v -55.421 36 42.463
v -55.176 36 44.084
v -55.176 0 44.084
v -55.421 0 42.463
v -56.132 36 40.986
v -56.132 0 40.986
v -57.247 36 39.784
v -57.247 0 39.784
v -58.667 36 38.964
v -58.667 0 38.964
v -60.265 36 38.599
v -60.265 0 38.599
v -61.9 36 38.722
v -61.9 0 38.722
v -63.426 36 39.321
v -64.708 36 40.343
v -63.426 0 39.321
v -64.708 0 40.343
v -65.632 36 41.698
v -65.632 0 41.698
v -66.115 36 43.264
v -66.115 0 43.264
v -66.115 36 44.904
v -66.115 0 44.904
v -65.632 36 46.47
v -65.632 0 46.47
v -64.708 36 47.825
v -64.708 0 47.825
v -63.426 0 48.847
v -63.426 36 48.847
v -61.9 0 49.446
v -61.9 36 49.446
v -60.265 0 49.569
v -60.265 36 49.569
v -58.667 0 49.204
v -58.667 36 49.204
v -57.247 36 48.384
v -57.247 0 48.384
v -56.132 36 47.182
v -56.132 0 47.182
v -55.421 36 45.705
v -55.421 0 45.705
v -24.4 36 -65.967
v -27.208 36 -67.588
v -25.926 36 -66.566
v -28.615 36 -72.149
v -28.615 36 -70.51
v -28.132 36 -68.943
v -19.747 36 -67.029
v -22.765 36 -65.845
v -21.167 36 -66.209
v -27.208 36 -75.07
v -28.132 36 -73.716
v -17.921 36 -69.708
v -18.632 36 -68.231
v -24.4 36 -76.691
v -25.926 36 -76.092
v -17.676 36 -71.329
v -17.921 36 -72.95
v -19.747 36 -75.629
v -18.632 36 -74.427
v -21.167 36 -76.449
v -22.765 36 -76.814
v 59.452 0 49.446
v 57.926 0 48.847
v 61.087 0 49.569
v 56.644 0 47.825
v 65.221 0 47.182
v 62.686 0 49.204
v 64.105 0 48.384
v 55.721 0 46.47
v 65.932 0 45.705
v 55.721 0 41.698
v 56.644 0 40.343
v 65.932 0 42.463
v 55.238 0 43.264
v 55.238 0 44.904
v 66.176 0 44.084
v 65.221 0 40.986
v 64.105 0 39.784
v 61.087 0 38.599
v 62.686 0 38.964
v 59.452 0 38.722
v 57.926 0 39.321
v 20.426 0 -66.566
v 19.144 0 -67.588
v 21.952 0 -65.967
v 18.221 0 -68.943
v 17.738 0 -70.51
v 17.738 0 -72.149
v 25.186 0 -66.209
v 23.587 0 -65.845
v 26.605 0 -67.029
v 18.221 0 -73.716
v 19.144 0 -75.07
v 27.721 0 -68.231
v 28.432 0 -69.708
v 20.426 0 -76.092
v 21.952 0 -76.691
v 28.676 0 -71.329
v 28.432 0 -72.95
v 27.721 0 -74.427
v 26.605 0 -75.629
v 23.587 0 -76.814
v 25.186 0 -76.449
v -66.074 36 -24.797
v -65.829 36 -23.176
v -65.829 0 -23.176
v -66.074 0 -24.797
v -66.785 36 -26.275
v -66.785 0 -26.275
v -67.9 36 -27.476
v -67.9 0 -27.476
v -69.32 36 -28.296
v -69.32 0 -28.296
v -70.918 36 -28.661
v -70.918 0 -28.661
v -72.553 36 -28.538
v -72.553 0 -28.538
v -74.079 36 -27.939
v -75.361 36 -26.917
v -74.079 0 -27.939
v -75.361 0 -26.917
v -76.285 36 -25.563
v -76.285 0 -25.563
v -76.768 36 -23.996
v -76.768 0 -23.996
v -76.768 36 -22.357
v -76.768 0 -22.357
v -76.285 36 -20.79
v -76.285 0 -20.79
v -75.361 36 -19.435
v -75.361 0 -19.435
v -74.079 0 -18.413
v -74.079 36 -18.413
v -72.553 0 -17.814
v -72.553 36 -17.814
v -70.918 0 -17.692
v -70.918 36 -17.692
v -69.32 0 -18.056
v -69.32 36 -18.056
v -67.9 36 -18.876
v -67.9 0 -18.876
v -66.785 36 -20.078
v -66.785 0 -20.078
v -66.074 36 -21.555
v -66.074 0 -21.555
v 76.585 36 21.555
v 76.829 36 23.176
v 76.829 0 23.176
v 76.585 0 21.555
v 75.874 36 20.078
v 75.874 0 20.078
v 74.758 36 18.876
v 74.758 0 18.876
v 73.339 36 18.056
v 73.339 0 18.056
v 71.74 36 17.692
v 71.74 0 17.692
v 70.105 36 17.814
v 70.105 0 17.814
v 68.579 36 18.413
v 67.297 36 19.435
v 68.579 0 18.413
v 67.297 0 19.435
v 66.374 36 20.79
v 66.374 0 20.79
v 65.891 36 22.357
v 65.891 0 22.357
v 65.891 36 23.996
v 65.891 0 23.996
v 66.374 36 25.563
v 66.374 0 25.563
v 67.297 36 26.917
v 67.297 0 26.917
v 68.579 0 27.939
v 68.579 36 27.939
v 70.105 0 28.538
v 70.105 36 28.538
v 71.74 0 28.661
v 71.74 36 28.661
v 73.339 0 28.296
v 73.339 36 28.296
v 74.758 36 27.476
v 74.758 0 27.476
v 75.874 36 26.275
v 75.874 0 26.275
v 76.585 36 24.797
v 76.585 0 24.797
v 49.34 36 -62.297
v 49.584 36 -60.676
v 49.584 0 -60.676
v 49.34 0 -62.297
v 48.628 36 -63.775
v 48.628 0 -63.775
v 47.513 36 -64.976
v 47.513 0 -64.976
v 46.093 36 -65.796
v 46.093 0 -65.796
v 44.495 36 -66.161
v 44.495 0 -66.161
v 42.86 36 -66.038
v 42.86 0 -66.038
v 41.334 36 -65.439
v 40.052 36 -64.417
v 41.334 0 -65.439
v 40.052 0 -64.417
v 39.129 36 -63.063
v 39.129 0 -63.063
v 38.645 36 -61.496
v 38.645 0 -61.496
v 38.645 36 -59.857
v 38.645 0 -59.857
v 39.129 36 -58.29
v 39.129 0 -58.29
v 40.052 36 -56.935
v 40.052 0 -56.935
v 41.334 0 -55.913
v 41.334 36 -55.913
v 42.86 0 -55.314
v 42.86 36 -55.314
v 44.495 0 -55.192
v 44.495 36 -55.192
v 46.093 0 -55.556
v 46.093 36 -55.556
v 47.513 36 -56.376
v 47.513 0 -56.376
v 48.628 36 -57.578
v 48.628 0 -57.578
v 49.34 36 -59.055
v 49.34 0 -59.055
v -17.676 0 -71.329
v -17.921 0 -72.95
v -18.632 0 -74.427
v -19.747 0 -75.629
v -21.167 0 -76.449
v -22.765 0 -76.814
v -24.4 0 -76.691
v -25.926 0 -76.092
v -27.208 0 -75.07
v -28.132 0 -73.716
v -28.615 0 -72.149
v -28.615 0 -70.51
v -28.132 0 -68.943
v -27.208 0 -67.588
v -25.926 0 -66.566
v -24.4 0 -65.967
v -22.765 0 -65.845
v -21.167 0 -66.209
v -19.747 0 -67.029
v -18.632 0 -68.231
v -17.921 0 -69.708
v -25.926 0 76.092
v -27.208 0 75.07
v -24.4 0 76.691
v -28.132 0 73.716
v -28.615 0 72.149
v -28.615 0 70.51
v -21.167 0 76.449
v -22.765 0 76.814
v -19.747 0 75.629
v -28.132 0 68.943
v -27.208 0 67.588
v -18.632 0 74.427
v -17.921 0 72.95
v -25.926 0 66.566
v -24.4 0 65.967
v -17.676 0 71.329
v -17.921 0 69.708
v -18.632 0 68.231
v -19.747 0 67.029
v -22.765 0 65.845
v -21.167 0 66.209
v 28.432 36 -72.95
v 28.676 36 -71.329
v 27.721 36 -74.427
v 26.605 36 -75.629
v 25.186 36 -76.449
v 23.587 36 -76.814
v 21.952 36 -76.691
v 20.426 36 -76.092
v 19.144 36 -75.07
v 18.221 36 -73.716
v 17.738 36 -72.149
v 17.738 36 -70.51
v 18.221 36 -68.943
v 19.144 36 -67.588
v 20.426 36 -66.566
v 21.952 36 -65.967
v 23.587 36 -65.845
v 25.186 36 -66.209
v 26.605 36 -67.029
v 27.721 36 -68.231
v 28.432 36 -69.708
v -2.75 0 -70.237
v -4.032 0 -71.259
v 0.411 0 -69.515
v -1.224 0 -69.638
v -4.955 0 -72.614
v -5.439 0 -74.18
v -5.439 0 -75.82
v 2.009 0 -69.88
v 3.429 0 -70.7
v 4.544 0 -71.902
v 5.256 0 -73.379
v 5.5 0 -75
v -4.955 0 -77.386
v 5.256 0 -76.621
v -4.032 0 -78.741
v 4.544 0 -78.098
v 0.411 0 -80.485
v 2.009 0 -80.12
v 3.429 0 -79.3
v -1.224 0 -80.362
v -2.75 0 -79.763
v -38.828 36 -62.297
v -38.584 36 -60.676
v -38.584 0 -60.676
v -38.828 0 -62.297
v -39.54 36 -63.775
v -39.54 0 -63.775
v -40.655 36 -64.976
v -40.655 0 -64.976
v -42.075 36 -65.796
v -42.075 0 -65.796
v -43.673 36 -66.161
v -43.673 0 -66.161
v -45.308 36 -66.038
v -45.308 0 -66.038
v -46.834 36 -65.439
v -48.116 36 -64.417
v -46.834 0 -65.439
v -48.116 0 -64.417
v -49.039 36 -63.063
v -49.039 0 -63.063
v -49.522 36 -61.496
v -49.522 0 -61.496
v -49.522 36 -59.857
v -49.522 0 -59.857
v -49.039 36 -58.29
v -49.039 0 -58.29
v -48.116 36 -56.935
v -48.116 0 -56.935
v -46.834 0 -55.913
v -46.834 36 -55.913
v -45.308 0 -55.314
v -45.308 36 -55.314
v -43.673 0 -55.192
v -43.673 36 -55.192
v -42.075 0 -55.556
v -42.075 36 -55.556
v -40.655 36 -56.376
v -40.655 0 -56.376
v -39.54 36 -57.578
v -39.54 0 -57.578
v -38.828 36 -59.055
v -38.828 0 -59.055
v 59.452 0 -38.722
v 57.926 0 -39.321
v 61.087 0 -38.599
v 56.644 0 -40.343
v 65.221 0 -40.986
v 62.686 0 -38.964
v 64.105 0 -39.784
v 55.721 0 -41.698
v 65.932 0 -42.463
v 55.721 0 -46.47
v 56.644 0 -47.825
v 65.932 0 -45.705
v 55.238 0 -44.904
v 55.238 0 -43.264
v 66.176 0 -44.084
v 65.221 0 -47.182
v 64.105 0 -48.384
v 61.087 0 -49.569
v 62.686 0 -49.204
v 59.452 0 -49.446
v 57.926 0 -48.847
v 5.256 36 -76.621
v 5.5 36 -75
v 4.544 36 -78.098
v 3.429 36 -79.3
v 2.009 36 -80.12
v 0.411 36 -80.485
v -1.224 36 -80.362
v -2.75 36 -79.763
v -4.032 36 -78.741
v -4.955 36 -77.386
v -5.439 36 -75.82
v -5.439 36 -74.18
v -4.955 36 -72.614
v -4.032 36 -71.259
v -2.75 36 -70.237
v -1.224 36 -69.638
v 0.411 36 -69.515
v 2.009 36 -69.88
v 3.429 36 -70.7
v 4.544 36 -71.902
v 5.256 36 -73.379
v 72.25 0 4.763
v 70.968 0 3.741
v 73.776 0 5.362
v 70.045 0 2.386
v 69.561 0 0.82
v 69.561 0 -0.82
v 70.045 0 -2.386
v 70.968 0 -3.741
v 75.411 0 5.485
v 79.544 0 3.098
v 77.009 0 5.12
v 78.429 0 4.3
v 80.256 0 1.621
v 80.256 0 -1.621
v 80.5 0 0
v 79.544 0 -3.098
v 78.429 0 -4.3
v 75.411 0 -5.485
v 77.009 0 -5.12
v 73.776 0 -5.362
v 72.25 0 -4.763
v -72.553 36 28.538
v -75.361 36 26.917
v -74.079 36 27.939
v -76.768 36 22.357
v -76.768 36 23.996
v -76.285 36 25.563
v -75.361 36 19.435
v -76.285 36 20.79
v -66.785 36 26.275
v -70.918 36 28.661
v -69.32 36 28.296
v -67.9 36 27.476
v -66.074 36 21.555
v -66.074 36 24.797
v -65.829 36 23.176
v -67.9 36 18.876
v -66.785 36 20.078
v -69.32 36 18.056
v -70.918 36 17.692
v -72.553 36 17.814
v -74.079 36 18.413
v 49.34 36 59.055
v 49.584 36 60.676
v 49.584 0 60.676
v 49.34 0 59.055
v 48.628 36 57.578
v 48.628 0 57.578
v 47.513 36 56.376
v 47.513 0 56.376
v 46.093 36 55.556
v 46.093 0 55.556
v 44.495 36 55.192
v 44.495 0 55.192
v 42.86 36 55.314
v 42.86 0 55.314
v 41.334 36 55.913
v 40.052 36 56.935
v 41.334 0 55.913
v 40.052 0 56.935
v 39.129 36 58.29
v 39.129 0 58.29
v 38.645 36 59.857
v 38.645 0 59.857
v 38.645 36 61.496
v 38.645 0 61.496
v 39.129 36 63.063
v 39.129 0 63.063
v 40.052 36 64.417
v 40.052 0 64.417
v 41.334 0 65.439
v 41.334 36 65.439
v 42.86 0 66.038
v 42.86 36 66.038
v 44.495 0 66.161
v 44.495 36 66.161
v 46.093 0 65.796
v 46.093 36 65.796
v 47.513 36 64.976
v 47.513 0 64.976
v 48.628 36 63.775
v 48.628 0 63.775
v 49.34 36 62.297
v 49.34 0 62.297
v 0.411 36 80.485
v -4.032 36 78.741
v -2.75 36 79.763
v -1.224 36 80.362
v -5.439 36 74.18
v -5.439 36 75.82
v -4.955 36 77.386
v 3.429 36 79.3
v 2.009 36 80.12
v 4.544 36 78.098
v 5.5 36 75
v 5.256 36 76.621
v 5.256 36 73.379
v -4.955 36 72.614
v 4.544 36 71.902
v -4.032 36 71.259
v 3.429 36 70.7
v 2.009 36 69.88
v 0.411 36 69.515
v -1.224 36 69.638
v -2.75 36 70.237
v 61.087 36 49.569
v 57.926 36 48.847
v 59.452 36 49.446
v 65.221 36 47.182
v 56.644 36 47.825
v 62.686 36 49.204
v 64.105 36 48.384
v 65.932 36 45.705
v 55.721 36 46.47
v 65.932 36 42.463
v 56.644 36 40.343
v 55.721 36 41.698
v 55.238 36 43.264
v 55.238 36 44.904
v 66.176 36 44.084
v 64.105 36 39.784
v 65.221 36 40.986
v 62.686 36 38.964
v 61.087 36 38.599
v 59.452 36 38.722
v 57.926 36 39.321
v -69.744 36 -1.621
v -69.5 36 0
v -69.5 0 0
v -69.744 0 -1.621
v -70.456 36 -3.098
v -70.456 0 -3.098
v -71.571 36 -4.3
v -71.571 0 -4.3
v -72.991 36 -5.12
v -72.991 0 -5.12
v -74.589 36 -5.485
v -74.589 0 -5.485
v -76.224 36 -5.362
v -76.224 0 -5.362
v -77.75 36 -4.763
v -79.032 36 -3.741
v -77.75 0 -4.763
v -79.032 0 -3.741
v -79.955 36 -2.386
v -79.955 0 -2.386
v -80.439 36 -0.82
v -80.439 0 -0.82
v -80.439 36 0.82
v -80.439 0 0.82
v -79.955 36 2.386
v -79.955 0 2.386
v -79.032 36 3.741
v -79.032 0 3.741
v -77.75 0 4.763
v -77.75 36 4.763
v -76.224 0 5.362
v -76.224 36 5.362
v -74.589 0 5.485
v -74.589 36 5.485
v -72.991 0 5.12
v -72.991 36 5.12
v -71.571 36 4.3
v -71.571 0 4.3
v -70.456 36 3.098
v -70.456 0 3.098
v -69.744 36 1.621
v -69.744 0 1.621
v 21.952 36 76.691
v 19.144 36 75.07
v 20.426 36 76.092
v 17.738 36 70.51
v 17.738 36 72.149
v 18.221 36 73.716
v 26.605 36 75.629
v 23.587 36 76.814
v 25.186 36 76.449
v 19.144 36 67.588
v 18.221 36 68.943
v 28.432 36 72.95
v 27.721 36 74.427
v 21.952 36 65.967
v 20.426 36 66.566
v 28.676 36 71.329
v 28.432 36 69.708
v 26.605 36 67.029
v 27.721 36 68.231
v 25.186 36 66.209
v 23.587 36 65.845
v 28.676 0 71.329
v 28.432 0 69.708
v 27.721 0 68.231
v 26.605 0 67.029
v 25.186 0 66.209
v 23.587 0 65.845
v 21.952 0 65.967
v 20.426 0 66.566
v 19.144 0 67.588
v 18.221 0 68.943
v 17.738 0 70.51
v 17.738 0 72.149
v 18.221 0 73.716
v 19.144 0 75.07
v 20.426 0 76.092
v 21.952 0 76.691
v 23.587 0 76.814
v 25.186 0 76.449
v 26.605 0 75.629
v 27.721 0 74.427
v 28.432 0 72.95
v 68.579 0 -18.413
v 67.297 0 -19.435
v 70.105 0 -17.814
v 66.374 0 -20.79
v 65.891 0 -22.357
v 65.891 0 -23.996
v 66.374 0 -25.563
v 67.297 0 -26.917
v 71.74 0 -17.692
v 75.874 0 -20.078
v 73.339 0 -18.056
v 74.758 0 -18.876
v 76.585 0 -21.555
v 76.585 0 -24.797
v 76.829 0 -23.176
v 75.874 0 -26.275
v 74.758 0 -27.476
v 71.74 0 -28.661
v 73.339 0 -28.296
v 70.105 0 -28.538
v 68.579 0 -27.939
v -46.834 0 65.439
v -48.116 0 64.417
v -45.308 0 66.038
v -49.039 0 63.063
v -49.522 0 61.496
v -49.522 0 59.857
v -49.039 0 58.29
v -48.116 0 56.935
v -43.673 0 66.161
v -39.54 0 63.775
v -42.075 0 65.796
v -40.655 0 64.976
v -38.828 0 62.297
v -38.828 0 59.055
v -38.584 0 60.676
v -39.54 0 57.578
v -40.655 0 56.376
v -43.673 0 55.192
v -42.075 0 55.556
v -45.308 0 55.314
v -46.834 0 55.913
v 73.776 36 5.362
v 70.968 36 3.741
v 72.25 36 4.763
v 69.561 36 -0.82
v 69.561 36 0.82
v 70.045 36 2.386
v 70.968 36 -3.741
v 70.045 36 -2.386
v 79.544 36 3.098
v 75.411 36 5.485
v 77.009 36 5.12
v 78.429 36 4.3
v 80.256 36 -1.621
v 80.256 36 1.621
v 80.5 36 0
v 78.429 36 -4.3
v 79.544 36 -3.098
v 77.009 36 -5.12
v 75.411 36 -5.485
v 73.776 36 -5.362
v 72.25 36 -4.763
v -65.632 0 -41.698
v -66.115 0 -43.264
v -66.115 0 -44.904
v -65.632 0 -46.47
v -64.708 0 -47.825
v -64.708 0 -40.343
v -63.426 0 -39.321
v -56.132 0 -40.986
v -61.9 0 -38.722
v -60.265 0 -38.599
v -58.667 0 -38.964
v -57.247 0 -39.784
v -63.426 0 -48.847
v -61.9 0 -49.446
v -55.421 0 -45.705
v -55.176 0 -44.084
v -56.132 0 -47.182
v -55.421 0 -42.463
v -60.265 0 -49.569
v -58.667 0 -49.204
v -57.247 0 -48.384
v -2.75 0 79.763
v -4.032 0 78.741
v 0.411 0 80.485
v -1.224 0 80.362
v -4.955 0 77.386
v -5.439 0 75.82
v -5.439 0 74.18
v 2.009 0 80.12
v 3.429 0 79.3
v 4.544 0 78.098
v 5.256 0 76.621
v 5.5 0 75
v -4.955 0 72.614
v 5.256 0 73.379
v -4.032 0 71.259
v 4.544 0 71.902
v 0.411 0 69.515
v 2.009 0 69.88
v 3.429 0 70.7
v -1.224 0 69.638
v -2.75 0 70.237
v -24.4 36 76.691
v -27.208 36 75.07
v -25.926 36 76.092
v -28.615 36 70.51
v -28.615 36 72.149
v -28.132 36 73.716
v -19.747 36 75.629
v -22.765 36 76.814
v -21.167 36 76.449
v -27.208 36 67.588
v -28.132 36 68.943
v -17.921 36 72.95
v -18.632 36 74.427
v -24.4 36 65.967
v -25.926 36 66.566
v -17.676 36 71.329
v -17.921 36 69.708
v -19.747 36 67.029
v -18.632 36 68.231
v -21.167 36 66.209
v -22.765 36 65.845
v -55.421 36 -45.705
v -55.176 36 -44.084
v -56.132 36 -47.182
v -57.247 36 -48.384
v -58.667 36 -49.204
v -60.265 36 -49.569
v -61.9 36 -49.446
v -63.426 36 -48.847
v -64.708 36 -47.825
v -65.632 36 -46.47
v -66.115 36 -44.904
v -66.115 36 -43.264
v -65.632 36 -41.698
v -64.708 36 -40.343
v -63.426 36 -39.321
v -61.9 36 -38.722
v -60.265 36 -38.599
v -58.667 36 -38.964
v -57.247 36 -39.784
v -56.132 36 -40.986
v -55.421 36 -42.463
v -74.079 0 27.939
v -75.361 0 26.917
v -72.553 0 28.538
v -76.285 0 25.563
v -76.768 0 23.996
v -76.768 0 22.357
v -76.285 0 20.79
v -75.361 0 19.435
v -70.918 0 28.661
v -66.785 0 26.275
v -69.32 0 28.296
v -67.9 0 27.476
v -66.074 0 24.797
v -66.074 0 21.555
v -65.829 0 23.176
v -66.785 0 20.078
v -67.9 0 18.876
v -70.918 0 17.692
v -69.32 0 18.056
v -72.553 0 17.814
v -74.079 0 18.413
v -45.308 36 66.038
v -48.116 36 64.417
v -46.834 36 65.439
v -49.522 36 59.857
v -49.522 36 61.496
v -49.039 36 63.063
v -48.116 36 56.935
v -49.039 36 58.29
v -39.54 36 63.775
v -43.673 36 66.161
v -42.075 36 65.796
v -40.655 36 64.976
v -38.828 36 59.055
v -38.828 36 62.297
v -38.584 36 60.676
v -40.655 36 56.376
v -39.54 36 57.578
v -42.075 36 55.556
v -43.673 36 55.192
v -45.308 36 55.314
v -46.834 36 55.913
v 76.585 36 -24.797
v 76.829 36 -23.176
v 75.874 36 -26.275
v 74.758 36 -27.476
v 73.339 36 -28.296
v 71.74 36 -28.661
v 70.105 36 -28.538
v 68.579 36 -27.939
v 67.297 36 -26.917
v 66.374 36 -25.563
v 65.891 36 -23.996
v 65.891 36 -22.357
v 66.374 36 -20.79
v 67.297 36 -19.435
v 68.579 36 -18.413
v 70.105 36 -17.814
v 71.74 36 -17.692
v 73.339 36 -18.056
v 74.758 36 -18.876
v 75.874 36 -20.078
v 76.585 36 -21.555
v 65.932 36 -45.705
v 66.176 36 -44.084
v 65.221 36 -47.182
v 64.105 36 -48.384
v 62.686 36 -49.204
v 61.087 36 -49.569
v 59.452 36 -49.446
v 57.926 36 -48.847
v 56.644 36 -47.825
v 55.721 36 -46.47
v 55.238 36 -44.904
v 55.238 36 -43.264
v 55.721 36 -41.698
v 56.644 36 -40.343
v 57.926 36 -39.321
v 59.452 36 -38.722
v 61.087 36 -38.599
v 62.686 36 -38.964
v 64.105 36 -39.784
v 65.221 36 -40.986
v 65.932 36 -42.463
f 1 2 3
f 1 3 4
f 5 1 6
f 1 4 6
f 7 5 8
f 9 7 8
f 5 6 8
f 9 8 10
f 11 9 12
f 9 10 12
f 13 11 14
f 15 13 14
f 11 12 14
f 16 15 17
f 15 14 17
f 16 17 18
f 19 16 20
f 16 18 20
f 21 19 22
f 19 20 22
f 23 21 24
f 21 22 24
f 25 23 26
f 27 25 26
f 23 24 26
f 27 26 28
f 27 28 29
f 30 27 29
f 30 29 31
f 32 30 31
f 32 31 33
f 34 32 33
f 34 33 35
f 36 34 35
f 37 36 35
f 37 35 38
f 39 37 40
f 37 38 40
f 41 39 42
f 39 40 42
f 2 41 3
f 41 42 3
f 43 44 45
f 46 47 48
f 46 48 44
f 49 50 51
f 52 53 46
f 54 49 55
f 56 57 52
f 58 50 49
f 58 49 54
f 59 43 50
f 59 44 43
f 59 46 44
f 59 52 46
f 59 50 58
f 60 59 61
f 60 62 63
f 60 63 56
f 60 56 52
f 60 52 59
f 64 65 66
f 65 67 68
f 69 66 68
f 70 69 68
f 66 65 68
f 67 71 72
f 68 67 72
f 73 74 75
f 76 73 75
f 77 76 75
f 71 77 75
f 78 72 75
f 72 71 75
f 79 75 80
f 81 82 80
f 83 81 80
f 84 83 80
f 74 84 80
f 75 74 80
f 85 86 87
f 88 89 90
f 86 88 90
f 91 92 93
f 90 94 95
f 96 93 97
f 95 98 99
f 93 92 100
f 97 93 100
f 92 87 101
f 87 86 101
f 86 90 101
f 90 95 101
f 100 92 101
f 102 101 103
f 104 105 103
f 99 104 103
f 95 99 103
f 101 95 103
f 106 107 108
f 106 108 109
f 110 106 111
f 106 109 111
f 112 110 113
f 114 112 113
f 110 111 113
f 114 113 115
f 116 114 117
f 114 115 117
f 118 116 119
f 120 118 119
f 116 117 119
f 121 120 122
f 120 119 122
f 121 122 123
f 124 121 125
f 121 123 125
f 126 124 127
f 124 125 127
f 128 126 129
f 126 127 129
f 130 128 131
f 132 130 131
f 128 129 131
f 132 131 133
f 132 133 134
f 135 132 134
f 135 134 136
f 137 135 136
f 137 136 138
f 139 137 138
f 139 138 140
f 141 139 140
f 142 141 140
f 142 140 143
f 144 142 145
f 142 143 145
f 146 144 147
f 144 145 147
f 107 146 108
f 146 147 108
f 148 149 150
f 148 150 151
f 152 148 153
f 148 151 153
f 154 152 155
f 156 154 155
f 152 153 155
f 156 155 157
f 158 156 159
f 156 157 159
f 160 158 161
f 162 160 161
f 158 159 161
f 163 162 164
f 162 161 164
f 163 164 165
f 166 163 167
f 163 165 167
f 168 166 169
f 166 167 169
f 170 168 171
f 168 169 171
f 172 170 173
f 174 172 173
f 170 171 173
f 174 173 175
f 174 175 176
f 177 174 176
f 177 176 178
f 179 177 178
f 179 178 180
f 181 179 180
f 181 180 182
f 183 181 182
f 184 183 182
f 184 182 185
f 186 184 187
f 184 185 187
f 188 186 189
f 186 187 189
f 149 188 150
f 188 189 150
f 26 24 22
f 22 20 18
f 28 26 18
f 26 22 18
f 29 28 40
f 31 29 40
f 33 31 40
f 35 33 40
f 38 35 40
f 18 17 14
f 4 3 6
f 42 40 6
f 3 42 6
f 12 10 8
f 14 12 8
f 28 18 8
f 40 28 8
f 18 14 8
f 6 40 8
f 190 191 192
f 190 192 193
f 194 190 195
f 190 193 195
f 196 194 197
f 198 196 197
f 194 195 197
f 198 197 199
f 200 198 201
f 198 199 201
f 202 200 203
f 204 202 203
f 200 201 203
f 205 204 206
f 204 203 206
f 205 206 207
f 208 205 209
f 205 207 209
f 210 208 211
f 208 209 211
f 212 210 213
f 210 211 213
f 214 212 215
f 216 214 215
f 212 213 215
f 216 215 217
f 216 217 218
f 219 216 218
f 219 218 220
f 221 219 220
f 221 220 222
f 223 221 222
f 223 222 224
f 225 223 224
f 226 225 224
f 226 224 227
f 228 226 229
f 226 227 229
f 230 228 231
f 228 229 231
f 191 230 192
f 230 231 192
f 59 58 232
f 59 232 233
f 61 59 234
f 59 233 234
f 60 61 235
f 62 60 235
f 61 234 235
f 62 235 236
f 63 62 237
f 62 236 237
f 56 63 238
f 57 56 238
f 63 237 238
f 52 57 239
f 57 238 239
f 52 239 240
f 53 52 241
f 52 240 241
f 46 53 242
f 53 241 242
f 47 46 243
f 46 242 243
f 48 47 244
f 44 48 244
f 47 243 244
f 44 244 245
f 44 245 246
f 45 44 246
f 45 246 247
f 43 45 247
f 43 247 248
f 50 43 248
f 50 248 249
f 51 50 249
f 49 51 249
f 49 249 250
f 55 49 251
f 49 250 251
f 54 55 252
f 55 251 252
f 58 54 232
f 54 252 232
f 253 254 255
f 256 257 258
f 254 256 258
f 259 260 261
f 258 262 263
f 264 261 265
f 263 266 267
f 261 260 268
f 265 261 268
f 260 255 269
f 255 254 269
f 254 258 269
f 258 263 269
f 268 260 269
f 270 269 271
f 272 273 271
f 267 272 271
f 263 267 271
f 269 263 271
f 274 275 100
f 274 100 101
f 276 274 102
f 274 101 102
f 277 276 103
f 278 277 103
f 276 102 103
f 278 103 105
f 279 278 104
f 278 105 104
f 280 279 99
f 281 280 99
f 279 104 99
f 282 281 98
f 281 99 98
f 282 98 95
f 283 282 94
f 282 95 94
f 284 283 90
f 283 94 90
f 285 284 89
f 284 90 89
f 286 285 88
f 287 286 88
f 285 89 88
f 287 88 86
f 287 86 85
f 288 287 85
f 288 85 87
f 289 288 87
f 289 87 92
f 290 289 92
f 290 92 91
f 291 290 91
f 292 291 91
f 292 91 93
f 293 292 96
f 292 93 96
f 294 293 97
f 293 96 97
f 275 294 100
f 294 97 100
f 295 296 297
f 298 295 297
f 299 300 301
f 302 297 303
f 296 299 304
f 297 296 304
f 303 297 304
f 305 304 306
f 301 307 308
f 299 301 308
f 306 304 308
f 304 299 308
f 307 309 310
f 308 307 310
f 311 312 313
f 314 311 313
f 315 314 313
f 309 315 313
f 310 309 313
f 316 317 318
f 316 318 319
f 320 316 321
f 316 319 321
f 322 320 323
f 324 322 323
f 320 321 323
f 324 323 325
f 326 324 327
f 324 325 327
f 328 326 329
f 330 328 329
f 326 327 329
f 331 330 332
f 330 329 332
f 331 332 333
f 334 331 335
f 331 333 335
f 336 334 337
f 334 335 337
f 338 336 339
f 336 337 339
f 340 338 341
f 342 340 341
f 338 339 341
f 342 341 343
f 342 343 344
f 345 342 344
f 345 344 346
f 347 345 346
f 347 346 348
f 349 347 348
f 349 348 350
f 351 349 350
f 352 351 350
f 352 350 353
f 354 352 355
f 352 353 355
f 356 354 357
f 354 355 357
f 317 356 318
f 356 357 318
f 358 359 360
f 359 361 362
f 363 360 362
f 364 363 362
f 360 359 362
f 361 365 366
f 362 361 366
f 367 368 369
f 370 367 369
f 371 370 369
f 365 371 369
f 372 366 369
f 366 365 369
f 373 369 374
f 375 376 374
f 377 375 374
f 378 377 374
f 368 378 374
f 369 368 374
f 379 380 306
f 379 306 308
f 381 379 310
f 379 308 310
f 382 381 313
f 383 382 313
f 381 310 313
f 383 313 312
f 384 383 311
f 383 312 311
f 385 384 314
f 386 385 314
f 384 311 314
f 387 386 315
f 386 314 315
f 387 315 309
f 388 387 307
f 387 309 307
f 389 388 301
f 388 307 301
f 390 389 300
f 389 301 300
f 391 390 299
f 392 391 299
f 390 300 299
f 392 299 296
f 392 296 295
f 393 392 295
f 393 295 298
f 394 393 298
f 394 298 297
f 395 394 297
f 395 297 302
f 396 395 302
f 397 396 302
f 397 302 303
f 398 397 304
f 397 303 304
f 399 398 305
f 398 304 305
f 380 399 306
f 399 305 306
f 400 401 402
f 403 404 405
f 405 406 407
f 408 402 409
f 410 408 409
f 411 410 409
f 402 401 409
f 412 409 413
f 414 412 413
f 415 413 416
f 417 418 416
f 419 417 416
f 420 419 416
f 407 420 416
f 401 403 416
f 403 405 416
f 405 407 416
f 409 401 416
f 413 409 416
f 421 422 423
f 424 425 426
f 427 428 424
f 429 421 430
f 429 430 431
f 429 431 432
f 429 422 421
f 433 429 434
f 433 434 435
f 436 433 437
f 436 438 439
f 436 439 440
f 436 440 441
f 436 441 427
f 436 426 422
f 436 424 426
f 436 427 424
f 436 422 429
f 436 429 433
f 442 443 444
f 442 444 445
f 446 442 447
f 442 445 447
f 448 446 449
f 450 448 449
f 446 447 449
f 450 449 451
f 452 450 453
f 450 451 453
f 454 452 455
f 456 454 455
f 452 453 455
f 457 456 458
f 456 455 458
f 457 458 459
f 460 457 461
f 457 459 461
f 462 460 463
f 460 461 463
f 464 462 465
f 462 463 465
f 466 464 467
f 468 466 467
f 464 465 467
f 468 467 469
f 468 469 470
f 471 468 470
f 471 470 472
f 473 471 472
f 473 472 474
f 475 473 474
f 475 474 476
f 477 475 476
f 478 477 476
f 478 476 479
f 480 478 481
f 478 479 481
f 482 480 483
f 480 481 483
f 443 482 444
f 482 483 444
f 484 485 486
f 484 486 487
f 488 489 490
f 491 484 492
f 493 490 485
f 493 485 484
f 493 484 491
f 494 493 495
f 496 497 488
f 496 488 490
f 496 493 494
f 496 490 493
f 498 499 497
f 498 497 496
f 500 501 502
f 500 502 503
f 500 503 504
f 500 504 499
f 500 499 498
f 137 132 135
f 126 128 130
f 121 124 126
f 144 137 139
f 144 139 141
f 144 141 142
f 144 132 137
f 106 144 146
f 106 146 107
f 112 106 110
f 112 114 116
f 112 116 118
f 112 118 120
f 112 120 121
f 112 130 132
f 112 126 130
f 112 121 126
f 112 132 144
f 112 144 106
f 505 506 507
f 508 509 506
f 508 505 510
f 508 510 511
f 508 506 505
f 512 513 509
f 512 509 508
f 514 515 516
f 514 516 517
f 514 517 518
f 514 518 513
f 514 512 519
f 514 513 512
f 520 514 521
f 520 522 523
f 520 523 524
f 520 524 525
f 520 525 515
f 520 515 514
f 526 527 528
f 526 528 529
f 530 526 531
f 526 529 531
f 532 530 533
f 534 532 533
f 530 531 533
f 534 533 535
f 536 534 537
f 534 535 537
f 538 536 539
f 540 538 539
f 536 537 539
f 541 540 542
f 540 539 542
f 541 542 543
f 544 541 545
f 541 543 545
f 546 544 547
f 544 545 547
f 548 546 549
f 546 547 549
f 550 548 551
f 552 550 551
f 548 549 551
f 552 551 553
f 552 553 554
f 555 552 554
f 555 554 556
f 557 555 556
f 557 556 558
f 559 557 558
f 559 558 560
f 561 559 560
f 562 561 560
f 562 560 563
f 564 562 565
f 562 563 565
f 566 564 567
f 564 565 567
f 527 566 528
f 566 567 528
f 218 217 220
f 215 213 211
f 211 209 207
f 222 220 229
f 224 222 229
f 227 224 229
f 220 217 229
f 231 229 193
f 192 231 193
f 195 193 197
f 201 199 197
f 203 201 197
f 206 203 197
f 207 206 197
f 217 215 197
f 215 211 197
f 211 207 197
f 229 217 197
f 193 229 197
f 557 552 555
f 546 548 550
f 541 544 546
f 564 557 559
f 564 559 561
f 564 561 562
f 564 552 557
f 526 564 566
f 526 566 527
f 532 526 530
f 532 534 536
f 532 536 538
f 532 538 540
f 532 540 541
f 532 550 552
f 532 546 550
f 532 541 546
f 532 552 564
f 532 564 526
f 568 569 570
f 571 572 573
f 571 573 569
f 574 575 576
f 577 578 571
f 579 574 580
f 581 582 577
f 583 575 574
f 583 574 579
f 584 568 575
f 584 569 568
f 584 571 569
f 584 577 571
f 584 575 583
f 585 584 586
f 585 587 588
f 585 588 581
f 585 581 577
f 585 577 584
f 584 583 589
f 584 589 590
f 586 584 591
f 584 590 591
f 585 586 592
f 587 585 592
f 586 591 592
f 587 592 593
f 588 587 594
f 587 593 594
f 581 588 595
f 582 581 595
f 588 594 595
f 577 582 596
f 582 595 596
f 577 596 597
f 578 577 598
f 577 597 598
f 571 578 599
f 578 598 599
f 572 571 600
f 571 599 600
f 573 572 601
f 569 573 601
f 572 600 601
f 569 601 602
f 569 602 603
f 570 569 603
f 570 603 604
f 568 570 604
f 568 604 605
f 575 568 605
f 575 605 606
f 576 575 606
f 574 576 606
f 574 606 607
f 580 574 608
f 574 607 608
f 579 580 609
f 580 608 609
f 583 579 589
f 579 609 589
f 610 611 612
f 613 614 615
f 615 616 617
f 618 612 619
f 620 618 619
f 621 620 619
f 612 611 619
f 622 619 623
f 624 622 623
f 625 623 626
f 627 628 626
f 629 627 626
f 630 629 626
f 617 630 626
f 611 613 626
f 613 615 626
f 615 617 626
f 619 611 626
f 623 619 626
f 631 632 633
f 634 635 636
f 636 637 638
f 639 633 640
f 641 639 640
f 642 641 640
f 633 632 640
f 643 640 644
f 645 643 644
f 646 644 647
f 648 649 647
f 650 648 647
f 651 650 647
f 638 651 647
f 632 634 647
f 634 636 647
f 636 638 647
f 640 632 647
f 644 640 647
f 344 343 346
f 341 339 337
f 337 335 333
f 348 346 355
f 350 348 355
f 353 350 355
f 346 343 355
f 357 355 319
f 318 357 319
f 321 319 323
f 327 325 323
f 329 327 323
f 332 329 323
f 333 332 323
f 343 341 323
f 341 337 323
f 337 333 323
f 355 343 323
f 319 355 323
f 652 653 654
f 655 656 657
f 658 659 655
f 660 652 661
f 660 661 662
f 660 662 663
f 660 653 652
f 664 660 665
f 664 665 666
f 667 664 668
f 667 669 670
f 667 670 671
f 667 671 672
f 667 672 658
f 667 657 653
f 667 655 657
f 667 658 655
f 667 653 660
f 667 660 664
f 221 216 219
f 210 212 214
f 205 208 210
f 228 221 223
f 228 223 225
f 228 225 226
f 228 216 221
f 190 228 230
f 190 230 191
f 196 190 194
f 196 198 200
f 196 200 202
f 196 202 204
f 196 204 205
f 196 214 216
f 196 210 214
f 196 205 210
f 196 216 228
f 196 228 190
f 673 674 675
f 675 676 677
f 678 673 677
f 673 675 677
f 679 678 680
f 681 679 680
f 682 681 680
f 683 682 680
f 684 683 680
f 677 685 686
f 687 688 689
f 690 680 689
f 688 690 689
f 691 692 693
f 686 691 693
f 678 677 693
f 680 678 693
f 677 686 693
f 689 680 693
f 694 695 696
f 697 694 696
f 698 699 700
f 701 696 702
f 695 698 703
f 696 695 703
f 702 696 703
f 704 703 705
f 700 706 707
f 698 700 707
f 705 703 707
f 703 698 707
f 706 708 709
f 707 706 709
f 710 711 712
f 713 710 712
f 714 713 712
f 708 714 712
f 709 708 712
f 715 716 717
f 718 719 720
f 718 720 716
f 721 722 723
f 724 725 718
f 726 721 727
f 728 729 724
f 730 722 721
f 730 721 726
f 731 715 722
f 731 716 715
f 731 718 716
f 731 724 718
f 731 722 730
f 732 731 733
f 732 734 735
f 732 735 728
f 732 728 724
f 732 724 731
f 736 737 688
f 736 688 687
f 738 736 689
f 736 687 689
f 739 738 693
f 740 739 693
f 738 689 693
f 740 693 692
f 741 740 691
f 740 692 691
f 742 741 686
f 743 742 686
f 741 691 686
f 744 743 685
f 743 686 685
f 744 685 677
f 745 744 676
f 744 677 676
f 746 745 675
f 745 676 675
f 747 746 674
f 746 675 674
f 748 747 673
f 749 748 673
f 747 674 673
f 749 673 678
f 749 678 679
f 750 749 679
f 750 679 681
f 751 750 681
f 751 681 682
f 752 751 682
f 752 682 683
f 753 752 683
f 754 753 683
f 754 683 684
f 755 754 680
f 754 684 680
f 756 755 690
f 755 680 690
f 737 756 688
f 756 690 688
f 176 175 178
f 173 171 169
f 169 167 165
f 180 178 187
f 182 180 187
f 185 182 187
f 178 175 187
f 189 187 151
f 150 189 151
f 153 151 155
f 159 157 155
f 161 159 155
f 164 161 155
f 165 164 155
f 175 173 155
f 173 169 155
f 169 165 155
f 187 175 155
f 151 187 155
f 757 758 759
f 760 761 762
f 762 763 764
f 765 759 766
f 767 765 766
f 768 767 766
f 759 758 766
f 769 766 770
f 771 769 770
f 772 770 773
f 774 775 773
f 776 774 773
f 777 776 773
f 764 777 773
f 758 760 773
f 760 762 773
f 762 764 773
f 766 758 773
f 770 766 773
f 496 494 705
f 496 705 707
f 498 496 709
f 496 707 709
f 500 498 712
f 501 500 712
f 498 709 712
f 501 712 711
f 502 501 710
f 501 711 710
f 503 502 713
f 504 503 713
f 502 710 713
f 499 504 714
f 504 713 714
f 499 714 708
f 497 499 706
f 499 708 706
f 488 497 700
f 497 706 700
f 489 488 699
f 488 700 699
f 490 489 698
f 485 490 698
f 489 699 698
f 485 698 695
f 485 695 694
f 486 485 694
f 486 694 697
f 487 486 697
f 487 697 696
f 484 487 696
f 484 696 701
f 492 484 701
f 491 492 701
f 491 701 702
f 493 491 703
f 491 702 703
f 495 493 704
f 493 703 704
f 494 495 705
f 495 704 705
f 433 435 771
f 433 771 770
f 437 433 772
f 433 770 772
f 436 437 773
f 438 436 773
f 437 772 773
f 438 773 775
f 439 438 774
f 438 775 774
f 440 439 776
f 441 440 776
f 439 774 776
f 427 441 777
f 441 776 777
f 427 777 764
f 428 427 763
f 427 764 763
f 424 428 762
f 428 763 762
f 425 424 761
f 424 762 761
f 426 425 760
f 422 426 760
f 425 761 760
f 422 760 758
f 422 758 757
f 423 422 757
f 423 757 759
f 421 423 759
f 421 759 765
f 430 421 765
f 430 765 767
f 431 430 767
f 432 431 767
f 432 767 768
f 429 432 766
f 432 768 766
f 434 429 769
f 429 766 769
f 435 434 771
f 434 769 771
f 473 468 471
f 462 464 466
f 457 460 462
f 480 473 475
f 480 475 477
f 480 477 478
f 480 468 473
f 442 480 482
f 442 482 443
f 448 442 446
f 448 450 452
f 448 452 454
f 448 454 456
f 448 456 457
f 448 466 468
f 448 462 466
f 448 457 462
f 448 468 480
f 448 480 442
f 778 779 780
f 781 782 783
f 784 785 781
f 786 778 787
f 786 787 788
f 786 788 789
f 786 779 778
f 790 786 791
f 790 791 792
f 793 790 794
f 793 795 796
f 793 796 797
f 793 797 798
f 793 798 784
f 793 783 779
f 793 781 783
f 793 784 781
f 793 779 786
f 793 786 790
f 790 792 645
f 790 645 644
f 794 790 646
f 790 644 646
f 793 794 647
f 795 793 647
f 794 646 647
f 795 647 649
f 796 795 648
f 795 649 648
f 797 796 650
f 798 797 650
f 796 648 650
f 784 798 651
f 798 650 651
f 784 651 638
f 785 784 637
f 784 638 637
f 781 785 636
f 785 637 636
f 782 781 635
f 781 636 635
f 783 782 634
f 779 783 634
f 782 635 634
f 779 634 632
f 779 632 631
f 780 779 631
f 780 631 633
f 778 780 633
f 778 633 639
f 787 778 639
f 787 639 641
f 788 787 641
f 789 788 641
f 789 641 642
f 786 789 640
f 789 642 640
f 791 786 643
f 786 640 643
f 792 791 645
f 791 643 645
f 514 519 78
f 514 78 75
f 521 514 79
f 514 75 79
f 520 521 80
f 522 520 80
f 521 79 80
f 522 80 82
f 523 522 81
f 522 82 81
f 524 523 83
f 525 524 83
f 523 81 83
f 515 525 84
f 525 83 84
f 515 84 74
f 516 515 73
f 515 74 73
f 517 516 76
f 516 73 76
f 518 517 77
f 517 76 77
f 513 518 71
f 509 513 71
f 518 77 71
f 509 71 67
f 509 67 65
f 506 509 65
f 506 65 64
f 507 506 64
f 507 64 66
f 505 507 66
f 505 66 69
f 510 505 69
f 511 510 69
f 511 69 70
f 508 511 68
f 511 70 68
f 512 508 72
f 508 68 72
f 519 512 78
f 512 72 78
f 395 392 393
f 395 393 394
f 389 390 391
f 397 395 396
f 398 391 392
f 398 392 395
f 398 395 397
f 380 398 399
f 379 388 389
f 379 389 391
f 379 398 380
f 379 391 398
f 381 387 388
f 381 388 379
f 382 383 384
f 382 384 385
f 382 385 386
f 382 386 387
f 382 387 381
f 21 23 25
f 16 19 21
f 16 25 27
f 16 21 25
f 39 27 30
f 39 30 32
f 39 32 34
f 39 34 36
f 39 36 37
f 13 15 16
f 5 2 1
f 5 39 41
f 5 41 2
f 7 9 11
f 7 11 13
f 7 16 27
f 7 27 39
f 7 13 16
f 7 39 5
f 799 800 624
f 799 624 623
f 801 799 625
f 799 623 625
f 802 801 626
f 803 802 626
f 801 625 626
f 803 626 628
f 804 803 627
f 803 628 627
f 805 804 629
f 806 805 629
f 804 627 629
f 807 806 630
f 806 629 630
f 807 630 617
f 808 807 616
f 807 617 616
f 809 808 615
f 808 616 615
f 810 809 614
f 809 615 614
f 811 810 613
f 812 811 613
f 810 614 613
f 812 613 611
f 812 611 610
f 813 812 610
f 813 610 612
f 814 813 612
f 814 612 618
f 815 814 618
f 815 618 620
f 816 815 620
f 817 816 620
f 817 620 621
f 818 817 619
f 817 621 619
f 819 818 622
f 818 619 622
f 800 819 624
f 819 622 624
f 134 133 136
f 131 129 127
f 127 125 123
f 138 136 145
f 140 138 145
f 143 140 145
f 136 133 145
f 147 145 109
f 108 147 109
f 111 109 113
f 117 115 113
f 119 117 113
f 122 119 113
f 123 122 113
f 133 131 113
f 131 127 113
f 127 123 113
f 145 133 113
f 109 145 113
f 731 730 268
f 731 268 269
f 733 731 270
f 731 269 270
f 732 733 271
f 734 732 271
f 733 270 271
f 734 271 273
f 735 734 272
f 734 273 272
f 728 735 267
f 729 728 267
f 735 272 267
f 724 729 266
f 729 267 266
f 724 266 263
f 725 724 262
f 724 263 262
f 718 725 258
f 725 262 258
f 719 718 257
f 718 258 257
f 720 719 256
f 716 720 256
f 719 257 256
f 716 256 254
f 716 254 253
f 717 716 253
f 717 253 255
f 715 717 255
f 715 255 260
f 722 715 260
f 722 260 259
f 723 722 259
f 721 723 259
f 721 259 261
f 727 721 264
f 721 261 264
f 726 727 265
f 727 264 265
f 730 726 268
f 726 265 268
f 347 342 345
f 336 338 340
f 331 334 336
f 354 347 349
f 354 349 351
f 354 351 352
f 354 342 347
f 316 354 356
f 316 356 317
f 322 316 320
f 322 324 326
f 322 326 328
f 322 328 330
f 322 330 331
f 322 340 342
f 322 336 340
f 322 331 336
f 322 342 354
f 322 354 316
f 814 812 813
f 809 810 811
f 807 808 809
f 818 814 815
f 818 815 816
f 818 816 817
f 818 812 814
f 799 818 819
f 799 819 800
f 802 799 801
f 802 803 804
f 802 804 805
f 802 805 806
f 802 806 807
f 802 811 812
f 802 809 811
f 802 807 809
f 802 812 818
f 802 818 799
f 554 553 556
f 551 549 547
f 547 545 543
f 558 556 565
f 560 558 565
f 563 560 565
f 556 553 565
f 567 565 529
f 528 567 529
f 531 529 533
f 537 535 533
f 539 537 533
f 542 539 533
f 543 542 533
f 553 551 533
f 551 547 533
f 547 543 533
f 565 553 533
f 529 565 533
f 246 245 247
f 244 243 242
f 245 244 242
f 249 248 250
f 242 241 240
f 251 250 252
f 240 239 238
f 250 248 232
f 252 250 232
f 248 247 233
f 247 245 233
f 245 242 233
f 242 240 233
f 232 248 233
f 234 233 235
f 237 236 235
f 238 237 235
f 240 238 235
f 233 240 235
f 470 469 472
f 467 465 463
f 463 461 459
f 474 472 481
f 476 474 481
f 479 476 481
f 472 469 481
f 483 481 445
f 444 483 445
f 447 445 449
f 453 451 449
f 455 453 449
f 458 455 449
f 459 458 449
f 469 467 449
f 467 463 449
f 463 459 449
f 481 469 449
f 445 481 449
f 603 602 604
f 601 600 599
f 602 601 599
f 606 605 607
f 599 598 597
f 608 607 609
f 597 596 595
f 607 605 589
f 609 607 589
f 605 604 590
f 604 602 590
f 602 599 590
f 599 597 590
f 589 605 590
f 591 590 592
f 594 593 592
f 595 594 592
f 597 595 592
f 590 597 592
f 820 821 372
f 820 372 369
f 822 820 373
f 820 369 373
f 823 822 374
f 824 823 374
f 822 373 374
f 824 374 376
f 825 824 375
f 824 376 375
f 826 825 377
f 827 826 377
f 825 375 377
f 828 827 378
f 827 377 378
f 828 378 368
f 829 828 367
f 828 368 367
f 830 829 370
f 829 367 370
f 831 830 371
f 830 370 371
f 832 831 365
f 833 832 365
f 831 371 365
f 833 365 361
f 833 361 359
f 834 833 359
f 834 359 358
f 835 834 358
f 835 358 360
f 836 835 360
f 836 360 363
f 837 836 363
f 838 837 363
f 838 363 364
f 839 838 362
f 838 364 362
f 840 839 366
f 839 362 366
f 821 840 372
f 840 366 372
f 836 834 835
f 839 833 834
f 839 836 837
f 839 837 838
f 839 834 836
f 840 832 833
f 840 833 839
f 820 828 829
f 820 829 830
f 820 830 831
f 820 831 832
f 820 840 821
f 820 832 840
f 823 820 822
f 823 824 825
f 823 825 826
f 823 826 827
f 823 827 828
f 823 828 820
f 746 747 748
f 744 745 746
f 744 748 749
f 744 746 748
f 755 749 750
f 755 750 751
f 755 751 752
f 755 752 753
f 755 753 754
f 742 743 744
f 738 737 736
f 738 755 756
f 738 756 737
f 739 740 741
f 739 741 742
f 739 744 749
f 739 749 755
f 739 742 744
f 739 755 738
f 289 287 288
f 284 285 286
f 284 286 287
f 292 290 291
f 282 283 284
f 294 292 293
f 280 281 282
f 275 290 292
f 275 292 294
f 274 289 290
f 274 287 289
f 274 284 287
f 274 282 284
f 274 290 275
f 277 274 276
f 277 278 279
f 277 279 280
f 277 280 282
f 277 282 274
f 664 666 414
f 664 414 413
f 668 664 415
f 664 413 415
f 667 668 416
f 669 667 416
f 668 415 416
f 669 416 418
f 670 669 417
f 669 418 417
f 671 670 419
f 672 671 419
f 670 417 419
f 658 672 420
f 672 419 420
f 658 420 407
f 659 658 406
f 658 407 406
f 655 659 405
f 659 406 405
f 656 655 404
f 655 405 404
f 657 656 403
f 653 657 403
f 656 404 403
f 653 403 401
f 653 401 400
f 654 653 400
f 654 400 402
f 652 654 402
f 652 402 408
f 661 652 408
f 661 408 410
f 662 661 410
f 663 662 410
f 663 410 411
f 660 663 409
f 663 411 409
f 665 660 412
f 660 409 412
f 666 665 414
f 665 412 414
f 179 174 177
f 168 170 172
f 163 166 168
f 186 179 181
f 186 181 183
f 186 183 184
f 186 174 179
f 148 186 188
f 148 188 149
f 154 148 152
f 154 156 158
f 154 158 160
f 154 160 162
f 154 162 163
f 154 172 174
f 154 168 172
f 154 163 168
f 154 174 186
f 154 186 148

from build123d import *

# Parameters (mm, degrees)
SKETCH1_R              = 5.5
BOSS_EXTRUDE1_DEPTH    = 36
BOSS_EXTRUDE1_2_DEPTH  = 36
BOSS_EXTRUDE1_3_DEPTH  = 36
BOSS_EXTRUDE1_4_DEPTH  = 36
BOSS_EXTRUDE1_5_DEPTH  = 36
BOSS_EXTRUDE1_6_DEPTH  = 36
BOSS_EXTRUDE1_7_DEPTH  = 36
BOSS_EXTRUDE1_8_DEPTH  = 36
BOSS_EXTRUDE1_9_DEPTH  = 36
BOSS_EXTRUDE1_10_DEPTH = 36
BOSS_EXTRUDE1_11_DEPTH = 36
BOSS_EXTRUDE1_12_DEPTH = 36
BOSS_EXTRUDE1_13_DEPTH = 36
BOSS_EXTRUDE1_14_DEPTH = 36
BOSS_EXTRUDE1_15_DEPTH = 36
BOSS_EXTRUDE1_16_DEPTH = 36
BOSS_EXTRUDE1_17_DEPTH = 36
BOSS_EXTRUDE1_18_DEPTH = 36
BOSS_EXTRUDE1_19_DEPTH = 36
BOSS_EXTRUDE1_20_DEPTH = 36


with BuildPart() as part:
    # Sketch1 → Boss-Extrude1 (new body)
    with BuildSketch(Plane(origin=(0, 0, 0), x_dir=(1, 0, 0), z_dir=(0, 1, 0))):
        with Locations((75, 0)):
            Circle(SKETCH1_R)
    extrude(amount=BOSS_EXTRUDE1_DEPTH)


with BuildPart() as body_2:
    # Sketch1 → Boss-Extrude1 2 (new body)
    with BuildSketch(Plane(origin=(0, 0, 0), x_dir=(1, 0, 0), z_dir=(0, 1, 0))):
        with Locations((71.329238722, -23.176274578)):
            Circle(SKETCH1_R)
    extrude(amount=BOSS_EXTRUDE1_2_DEPTH)


with BuildPart() as body_3:
    # Sketch1 → Boss-Extrude1 3 (new body)
    with BuildSketch(Plane(origin=(0, 0, 0), x_dir=(1, 0, 0), z_dir=(0, 1, 0))):
        with Locations((60.676274578, -44.083893922)):
            Circle(SKETCH1_R)
    extrude(amount=BOSS_EXTRUDE1_3_DEPTH)


with BuildPart() as body_4:
    # Sketch1 → Boss-Extrude1 4 (new body)
    with BuildSketch(Plane(origin=(0, 0, 0), x_dir=(1, 0, 0), z_dir=(0, 1, 0))):
        with Locations((44.083893922, -60.676274578)):
            Circle(SKETCH1_R)
    extrude(amount=BOSS_EXTRUDE1_4_DEPTH)


with BuildPart() as body_5:
    # Sketch1 → Boss-Extrude1 5 (new body)
    with BuildSketch(Plane(origin=(0, 0, 0), x_dir=(1, 0, 0), z_dir=(0, 1, 0))):
        with Locations((23.176274578, -71.329238722)):
            Circle(SKETCH1_R)
    extrude(amount=BOSS_EXTRUDE1_5_DEPTH)


with BuildPart() as body_6:
    # Sketch1 → Boss-Extrude1 6 (new body)
    with BuildSketch(Plane(origin=(0, 0, 0), x_dir=(1, 0, 0), z_dir=(0, 1, 0))):
        with Locations((0, -75)):
            Circle(SKETCH1_R)
    extrude(amount=BOSS_EXTRUDE1_6_DEPTH)


with BuildPart() as body_7:
    # Sketch1 → Boss-Extrude1 7 (new body)
    with BuildSketch(Plane(origin=(0, 0, 0), x_dir=(1, 0, 0), z_dir=(0, 1, 0))):
        with Locations((-23.176274578, -71.329238722)):
            Circle(SKETCH1_R)
    extrude(amount=BOSS_EXTRUDE1_7_DEPTH)


with BuildPart() as body_8:
    # Sketch1 → Boss-Extrude1 8 (new body)
    with BuildSketch(Plane(origin=(0, 0, 0), x_dir=(1, 0, 0), z_dir=(0, 1, 0))):
        with Locations((-44.083893922, -60.676274578)):
            Circle(SKETCH1_R)
    extrude(amount=BOSS_EXTRUDE1_8_DEPTH)


with BuildPart() as body_9:
    # Sketch1 → Boss-Extrude1 9 (new body)
    with BuildSketch(Plane(origin=(0, 0, 0), x_dir=(1, 0, 0), z_dir=(0, 1, 0))):
        with Locations((-60.676274578, -44.083893922)):
            Circle(SKETCH1_R)
    extrude(amount=BOSS_EXTRUDE1_9_DEPTH)


with BuildPart() as body_10:
    # Sketch1 → Boss-Extrude1 10 (new body)
    with BuildSketch(Plane(origin=(0, 0, 0), x_dir=(1, 0, 0), z_dir=(0, 1, 0))):
        with Locations((-71.329238722, -23.176274578)):
            Circle(SKETCH1_R)
    extrude(amount=BOSS_EXTRUDE1_10_DEPTH)


with BuildPart() as body_11:
    # Sketch1 → Boss-Extrude1 11 (new body)
    with BuildSketch(Plane(origin=(0, 0, 0), x_dir=(1, 0, 0), z_dir=(0, 1, 0))):
        with Locations((-75, 0)):
            Circle(SKETCH1_R)
    extrude(amount=BOSS_EXTRUDE1_11_DEPTH)


with BuildPart() as body_12:
    # Sketch1 → Boss-Extrude1 12 (new body)
    with BuildSketch(Plane(origin=(0, 0, 0), x_dir=(1, 0, 0), z_dir=(0, 1, 0))):
        with Locations((-71.329238722, 23.176274578)):
            Circle(SKETCH1_R)
    extrude(amount=BOSS_EXTRUDE1_12_DEPTH)


with BuildPart() as body_13:
    # Sketch1 → Boss-Extrude1 13 (new body)
    with BuildSketch(Plane(origin=(0, 0, 0), x_dir=(1, 0, 0), z_dir=(0, 1, 0))):
        with Locations((-60.676274578, 44.083893922)):
            Circle(SKETCH1_R)
    extrude(amount=BOSS_EXTRUDE1_13_DEPTH)


with BuildPart() as body_14:
    # Sketch1 → Boss-Extrude1 14 (new body)
    with BuildSketch(Plane(origin=(0, 0, 0), x_dir=(1, 0, 0), z_dir=(0, 1, 0))):
        with Locations((-44.083893922, 60.676274578)):
            Circle(SKETCH1_R)
    extrude(amount=BOSS_EXTRUDE1_14_DEPTH)


with BuildPart() as body_15:
    # Sketch1 → Boss-Extrude1 15 (new body)
    with BuildSketch(Plane(origin=(0, 0, 0), x_dir=(1, 0, 0), z_dir=(0, 1, 0))):
        with Locations((-23.176274578, 71.329238722)):
            Circle(SKETCH1_R)
    extrude(amount=BOSS_EXTRUDE1_15_DEPTH)


with BuildPart() as body_16:
    # Sketch1 → Boss-Extrude1 16 (new body)
    with BuildSketch(Plane(origin=(0, 0, 0), x_dir=(1, 0, 0), z_dir=(0, 1, 0))):
        with Locations((0, 75)):
            Circle(SKETCH1_R)
    extrude(amount=BOSS_EXTRUDE1_16_DEPTH)


with BuildPart() as body_17:
    # Sketch1 → Boss-Extrude1 17 (new body)
    with BuildSketch(Plane(origin=(0, 0, 0), x_dir=(1, 0, 0), z_dir=(0, 1, 0))):
        with Locations((23.176274578, 71.329238722)):
            Circle(SKETCH1_R)
    extrude(amount=BOSS_EXTRUDE1_17_DEPTH)


with BuildPart() as body_18:
    # Sketch1 → Boss-Extrude1 18 (new body)
    with BuildSketch(Plane(origin=(0, 0, 0), x_dir=(1, 0, 0), z_dir=(0, 1, 0))):
        with Locations((44.083893922, 60.676274578)):
            Circle(SKETCH1_R)
    extrude(amount=BOSS_EXTRUDE1_18_DEPTH)


with BuildPart() as body_19:
    # Sketch1 → Boss-Extrude1 19 (new body)
    with BuildSketch(Plane(origin=(0, 0, 0), x_dir=(1, 0, 0), z_dir=(0, 1, 0))):
        with Locations((60.676274578, 44.083893922)):
            Circle(SKETCH1_R)
    extrude(amount=BOSS_EXTRUDE1_19_DEPTH)


with BuildPart() as body_20:
    # Sketch1 → Boss-Extrude1 20 (new body)
    with BuildSketch(Plane(origin=(0, 0, 0), x_dir=(1, 0, 0), z_dir=(0, 1, 0))):
        with Locations((71.329238722, 23.176274578)):
            Circle(SKETCH1_R)
    extrude(amount=BOSS_EXTRUDE1_20_DEPTH)


solid = Compound([part.part, body_2.part, body_3.part, body_4.part, body_5.part, body_6.part, body_7.part, body_8.part, body_9.part, body_10.part, body_11.part, body_12.part, body_13.part, body_14.part, body_15.part, body_16.part, body_17.part, body_18.part, body_19.part, body_20.part])
